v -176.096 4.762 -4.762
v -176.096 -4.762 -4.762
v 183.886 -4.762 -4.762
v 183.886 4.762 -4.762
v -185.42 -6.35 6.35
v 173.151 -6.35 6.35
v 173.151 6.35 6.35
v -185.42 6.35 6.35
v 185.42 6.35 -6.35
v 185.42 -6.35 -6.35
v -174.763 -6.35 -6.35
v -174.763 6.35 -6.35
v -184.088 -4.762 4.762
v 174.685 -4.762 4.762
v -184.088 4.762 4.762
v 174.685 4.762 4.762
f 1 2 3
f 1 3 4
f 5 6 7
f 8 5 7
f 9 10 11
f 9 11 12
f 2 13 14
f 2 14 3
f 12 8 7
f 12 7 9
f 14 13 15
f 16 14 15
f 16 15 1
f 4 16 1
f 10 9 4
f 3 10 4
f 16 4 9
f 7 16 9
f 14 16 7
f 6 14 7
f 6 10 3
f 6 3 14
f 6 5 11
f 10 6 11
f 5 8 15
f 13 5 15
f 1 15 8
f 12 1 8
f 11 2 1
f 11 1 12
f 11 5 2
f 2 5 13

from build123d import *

# Parameters (mm, degrees)
SKETCH1_W               = 12.7
SKETCH1_H               = 12.7
SKETCH1_W_2             = 9.525
SKETCH1_H_2             = 9.525
BOSS_EXTRUDE1_DEPTH     = 185.42
CUT_EXTRUDE1_DEPTH      = 186.637338378
CUT_EXTRUDE1_DEPTH_BACK = 186.637338378
CUT_EXTRUDE2_DEPTH      = 186.637338378
CUT_EXTRUDE2_DEPTH_BACK = 186.637338378


with BuildPart() as part:
    # Sketch1 → Boss-Extrude1 (new, symmetric)
    with BuildSketch(Plane(origin=(0, 0, 0), x_dir=(0, 0, -1), z_dir=(1, 0, 0))):
        Rectangle(SKETCH1_W, SKETCH1_H)
        Rectangle(SKETCH1_W_2, SKETCH1_H_2, mode=Mode.SUBTRACT)
    extrude(amount=BOSS_EXTRUDE1_DEPTH, both=True)

    # Sketch2 → Cut-Extrude1 (cut, two sides: drawn at the far end of the back side and taken through both)
    with BuildSketch(Plane(origin=(0, 0, 0), x_dir=(1, 0, 0), z_dir=(0, 1, 0)).offset(-CUT_EXTRUDE1_DEPTH_BACK)):
        Polygon((-185.42, -6.35), (-174.250456919, 6.961343094), (-183.078216502, 14.368712905), (-194.247759583, 1.057369811), align=None)
    extrude(amount=CUT_EXTRUDE1_DEPTH + CUT_EXTRUDE1_DEPTH_BACK, mode=Mode.SUBTRACT)

    # Sketch3 → Cut-Extrude2 (cut, two sides: drawn at the far end of the back side and taken through both)
    with BuildSketch(Plane(origin=(0, 0, 0), x_dir=(1, 0, 0), z_dir=(0, 1, 0)).offset(-CUT_EXTRUDE2_DEPTH_BACK)):
        Polygon((185.42, 6.35), (173.150938826, -6.35), (185.42, -6.35), align=None)
    extrude(amount=CUT_EXTRUDE2_DEPTH + CUT_EXTRUDE2_DEPTH_BACK, mode=Mode.SUBTRACT)


solid = part.part
